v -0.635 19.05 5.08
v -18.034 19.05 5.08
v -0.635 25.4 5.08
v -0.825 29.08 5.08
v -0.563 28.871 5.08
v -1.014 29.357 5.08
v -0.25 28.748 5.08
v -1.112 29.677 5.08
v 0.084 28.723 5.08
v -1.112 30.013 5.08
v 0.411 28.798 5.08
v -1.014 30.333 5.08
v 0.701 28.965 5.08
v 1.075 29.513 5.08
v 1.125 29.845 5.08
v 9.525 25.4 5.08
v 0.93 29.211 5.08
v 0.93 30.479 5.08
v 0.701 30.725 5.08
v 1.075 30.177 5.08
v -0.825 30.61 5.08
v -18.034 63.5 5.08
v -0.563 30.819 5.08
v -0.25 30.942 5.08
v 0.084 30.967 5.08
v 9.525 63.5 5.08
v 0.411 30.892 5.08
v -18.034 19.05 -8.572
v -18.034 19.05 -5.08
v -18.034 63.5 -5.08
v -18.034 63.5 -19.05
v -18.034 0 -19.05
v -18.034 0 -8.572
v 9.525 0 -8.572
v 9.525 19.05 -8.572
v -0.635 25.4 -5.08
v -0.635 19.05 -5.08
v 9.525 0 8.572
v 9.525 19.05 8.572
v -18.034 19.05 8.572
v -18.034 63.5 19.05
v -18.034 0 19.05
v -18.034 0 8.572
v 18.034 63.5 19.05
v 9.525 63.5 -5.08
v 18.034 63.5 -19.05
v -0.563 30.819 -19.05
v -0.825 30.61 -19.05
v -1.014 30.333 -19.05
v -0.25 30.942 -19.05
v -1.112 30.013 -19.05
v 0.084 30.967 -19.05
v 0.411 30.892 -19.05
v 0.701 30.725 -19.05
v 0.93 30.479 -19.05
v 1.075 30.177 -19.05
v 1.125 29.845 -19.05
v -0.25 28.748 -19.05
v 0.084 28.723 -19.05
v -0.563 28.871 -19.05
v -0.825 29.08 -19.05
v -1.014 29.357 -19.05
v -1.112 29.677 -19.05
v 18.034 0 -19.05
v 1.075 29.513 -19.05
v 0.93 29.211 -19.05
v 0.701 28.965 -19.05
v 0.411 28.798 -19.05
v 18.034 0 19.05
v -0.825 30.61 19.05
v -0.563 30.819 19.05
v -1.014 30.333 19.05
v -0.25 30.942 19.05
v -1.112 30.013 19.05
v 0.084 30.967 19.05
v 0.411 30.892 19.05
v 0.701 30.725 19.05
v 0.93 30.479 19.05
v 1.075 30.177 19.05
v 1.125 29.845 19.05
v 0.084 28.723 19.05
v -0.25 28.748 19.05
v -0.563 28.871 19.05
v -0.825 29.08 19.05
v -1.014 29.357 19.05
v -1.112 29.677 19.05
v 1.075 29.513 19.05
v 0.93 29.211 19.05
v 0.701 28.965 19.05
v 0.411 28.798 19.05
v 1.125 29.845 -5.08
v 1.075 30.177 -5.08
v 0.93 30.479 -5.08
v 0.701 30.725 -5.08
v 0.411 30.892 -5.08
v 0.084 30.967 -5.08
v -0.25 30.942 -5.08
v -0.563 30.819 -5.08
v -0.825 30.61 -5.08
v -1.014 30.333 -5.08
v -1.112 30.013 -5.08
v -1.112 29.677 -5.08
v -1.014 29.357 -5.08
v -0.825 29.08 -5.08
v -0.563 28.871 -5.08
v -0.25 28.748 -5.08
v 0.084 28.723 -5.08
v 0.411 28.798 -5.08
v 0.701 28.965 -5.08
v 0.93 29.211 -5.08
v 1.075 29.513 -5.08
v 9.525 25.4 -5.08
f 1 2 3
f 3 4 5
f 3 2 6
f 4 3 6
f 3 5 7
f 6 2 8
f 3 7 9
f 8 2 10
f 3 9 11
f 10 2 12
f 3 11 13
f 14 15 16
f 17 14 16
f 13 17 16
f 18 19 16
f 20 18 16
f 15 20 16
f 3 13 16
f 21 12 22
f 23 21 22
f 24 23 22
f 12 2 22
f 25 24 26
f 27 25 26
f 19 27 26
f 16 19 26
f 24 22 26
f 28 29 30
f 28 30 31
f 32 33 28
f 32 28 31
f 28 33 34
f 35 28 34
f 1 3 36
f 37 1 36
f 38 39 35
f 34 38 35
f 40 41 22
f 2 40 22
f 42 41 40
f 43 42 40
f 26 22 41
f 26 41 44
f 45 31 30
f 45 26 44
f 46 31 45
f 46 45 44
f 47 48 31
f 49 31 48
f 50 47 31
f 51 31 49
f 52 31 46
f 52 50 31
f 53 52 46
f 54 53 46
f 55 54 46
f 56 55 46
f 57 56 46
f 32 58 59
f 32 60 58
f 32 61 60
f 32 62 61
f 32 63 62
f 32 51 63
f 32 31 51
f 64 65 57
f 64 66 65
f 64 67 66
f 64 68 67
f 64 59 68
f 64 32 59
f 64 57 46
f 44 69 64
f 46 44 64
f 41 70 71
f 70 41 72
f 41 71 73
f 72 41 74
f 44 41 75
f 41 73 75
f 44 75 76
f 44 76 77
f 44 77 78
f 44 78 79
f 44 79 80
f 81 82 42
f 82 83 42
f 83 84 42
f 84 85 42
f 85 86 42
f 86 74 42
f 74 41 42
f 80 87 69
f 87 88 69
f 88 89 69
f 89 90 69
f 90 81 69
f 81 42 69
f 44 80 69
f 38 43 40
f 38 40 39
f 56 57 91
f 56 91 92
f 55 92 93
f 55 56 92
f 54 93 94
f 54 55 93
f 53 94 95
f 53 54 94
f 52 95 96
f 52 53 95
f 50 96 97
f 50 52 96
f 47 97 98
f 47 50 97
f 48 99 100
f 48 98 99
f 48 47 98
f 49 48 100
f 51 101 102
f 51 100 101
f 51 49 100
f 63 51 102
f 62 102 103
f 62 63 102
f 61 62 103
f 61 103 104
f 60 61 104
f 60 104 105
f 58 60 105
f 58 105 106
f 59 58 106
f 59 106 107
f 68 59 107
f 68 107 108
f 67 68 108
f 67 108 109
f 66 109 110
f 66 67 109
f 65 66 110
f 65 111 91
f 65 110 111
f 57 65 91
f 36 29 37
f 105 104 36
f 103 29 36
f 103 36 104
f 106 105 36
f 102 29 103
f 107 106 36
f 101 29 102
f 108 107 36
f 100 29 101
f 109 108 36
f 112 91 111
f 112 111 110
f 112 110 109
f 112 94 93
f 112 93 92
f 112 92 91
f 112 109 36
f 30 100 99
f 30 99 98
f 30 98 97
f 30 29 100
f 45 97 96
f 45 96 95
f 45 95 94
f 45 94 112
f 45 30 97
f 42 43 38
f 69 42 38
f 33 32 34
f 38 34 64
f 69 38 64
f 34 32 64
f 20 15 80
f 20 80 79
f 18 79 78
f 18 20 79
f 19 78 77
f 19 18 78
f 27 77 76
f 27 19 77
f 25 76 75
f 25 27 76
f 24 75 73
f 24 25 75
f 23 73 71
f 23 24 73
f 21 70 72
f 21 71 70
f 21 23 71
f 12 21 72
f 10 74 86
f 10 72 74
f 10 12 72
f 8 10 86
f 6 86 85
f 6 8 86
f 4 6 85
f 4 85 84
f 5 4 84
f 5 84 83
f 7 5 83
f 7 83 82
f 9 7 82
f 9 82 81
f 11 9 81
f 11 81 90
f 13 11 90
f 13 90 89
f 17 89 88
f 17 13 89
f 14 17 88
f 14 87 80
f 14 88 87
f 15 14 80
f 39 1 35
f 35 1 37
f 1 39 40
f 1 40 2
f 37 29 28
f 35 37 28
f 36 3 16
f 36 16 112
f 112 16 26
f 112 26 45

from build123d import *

# Parameters (mm, degrees)
SKETCH1_W               = 36.068
SKETCH1_H               = 38.1
BOSS_EXTRUDE1_DEPTH     = 63.5
SKETCH3_W               = 36.068
SKETCH3_H               = 10.16
CUT_EXTRUDE1_DEPTH      = 38.1
SKETCH4_W               = 36.068
SKETCH4_H               = 17.145
CUT_EXTRUDE2_DEPTH      = 19.05
SKETCH5_W               = 17.399
SKETCH5_H               = 10.16
CUT_EXTRUDE3_DEPTH      = 47.257298408
CUT_EXTRUDE4_DEPTH      = 71.283227416
CUT_EXTRUDE4_DEPTH_BACK = 71.283227416
SKETCH6_R               = 1.125
BOSS_EXTRUDE2_REACH     = 70.705
SKETCH7_W               = 8.509
SKETCH7_H               = 38.1
SKETCH8_W               = 10.16
SKETCH8_H               = 6.35
BOSS_EXTRUDE3_DEPTH     = 8.89


with BuildPart() as part:
    # Sketch1 → Boss-Extrude1 (new body)
    with BuildSketch(Plane(origin=(0, 0, 0), x_dir=(1, 0, 0), z_dir=(0, 1, 0))):
        Rectangle(SKETCH1_W, SKETCH1_H)
    extrude(amount=BOSS_EXTRUDE1_DEPTH)

    # Sketch3 → Cut-Extrude1 (cut)
    with BuildSketch(Plane(origin=(0, 63.5, 0), x_dir=(1, 0, 0), z_dir=(0, 1, 0))):
        Rectangle(SKETCH3_W, SKETCH3_H)
    extrude(amount=-CUT_EXTRUDE1_DEPTH, mode=Mode.SUBTRACT)

    # Sketch4 → Cut-Extrude2 (cut)
    with BuildSketch(Plane.XZ):
        Rectangle(SKETCH4_W, SKETCH4_H)
    extrude(amount=-CUT_EXTRUDE2_DEPTH, mode=Mode.SUBTRACT)

    # Sketch5 → Cut-Extrude3 (cut, through all)
    with BuildSketch(Plane(origin=(0, 25.4, 0), x_dir=(1, 0, 0), z_dir=(0, 1, 0))):
        with Locations((-9.3345, 0)):
            Rectangle(SKETCH5_W, SKETCH5_H)
        with Locations((9.3345, 0)):
            Rectangle(SKETCH5_W, SKETCH5_H)
    extrude(amount=-CUT_EXTRUDE3_DEPTH, mode=Mode.SUBTRACT)

    # Sketch6 → Cut-Extrude4 (cut, two sides: drawn at the far end of the back side and taken through both)
    with BuildSketch(Plane.XY.offset(-5.08).offset(-CUT_EXTRUDE4_DEPTH_BACK)):
        with Locations((0, 29.845)):
            Circle(SKETCH6_R)
    extrude(amount=CUT_EXTRUDE4_DEPTH + CUT_EXTRUDE4_DEPTH_BACK, mode=Mode.SUBTRACT)

    # Boss-Extrude2: up to this face of the body (flat: up to its plane)
    boss_extrude2_end = Plane(part.part.faces().sort_by_distance((0, 0, 13.81125))[0])
    # Sketch7 → Boss-Extrude2 (add, up to the picked face)
    with BuildSketch(Plane(origin=(0, 63.5, 0), x_dir=(1, 0, 0), z_dir=(0, 1, 0)), mode=Mode.PRIVATE) as boss_extrude2_sk1:
        with Locations((13.7795, 0)):
            Rectangle(SKETCH7_W, SKETCH7_H)
    boss_extrude2_tool1 = split(extrude(boss_extrude2_sk1.sketch, amount=-BOSS_EXTRUDE2_REACH, mode=Mode.PRIVATE), bisect_by=boss_extrude2_end, keep=Keep.BOTH, mode=Mode.PRIVATE)
    add(boss_extrude2_tool1.solids().sort_by(Axis((13.7795, 63.5, 0), (0, -1, 0)))[0])

    # Sketch8 → Boss-Extrude3 (add)
    with BuildSketch(Plane(origin=(0.635, 0, 0), x_dir=(0, 0, -1), z_dir=(1, 0, 0))):
        with Locations((0, 22.225)):
            Rectangle(SKETCH8_W, SKETCH8_H)
    extrude(amount=BOSS_EXTRUDE3_DEPTH)


solid = part.part
